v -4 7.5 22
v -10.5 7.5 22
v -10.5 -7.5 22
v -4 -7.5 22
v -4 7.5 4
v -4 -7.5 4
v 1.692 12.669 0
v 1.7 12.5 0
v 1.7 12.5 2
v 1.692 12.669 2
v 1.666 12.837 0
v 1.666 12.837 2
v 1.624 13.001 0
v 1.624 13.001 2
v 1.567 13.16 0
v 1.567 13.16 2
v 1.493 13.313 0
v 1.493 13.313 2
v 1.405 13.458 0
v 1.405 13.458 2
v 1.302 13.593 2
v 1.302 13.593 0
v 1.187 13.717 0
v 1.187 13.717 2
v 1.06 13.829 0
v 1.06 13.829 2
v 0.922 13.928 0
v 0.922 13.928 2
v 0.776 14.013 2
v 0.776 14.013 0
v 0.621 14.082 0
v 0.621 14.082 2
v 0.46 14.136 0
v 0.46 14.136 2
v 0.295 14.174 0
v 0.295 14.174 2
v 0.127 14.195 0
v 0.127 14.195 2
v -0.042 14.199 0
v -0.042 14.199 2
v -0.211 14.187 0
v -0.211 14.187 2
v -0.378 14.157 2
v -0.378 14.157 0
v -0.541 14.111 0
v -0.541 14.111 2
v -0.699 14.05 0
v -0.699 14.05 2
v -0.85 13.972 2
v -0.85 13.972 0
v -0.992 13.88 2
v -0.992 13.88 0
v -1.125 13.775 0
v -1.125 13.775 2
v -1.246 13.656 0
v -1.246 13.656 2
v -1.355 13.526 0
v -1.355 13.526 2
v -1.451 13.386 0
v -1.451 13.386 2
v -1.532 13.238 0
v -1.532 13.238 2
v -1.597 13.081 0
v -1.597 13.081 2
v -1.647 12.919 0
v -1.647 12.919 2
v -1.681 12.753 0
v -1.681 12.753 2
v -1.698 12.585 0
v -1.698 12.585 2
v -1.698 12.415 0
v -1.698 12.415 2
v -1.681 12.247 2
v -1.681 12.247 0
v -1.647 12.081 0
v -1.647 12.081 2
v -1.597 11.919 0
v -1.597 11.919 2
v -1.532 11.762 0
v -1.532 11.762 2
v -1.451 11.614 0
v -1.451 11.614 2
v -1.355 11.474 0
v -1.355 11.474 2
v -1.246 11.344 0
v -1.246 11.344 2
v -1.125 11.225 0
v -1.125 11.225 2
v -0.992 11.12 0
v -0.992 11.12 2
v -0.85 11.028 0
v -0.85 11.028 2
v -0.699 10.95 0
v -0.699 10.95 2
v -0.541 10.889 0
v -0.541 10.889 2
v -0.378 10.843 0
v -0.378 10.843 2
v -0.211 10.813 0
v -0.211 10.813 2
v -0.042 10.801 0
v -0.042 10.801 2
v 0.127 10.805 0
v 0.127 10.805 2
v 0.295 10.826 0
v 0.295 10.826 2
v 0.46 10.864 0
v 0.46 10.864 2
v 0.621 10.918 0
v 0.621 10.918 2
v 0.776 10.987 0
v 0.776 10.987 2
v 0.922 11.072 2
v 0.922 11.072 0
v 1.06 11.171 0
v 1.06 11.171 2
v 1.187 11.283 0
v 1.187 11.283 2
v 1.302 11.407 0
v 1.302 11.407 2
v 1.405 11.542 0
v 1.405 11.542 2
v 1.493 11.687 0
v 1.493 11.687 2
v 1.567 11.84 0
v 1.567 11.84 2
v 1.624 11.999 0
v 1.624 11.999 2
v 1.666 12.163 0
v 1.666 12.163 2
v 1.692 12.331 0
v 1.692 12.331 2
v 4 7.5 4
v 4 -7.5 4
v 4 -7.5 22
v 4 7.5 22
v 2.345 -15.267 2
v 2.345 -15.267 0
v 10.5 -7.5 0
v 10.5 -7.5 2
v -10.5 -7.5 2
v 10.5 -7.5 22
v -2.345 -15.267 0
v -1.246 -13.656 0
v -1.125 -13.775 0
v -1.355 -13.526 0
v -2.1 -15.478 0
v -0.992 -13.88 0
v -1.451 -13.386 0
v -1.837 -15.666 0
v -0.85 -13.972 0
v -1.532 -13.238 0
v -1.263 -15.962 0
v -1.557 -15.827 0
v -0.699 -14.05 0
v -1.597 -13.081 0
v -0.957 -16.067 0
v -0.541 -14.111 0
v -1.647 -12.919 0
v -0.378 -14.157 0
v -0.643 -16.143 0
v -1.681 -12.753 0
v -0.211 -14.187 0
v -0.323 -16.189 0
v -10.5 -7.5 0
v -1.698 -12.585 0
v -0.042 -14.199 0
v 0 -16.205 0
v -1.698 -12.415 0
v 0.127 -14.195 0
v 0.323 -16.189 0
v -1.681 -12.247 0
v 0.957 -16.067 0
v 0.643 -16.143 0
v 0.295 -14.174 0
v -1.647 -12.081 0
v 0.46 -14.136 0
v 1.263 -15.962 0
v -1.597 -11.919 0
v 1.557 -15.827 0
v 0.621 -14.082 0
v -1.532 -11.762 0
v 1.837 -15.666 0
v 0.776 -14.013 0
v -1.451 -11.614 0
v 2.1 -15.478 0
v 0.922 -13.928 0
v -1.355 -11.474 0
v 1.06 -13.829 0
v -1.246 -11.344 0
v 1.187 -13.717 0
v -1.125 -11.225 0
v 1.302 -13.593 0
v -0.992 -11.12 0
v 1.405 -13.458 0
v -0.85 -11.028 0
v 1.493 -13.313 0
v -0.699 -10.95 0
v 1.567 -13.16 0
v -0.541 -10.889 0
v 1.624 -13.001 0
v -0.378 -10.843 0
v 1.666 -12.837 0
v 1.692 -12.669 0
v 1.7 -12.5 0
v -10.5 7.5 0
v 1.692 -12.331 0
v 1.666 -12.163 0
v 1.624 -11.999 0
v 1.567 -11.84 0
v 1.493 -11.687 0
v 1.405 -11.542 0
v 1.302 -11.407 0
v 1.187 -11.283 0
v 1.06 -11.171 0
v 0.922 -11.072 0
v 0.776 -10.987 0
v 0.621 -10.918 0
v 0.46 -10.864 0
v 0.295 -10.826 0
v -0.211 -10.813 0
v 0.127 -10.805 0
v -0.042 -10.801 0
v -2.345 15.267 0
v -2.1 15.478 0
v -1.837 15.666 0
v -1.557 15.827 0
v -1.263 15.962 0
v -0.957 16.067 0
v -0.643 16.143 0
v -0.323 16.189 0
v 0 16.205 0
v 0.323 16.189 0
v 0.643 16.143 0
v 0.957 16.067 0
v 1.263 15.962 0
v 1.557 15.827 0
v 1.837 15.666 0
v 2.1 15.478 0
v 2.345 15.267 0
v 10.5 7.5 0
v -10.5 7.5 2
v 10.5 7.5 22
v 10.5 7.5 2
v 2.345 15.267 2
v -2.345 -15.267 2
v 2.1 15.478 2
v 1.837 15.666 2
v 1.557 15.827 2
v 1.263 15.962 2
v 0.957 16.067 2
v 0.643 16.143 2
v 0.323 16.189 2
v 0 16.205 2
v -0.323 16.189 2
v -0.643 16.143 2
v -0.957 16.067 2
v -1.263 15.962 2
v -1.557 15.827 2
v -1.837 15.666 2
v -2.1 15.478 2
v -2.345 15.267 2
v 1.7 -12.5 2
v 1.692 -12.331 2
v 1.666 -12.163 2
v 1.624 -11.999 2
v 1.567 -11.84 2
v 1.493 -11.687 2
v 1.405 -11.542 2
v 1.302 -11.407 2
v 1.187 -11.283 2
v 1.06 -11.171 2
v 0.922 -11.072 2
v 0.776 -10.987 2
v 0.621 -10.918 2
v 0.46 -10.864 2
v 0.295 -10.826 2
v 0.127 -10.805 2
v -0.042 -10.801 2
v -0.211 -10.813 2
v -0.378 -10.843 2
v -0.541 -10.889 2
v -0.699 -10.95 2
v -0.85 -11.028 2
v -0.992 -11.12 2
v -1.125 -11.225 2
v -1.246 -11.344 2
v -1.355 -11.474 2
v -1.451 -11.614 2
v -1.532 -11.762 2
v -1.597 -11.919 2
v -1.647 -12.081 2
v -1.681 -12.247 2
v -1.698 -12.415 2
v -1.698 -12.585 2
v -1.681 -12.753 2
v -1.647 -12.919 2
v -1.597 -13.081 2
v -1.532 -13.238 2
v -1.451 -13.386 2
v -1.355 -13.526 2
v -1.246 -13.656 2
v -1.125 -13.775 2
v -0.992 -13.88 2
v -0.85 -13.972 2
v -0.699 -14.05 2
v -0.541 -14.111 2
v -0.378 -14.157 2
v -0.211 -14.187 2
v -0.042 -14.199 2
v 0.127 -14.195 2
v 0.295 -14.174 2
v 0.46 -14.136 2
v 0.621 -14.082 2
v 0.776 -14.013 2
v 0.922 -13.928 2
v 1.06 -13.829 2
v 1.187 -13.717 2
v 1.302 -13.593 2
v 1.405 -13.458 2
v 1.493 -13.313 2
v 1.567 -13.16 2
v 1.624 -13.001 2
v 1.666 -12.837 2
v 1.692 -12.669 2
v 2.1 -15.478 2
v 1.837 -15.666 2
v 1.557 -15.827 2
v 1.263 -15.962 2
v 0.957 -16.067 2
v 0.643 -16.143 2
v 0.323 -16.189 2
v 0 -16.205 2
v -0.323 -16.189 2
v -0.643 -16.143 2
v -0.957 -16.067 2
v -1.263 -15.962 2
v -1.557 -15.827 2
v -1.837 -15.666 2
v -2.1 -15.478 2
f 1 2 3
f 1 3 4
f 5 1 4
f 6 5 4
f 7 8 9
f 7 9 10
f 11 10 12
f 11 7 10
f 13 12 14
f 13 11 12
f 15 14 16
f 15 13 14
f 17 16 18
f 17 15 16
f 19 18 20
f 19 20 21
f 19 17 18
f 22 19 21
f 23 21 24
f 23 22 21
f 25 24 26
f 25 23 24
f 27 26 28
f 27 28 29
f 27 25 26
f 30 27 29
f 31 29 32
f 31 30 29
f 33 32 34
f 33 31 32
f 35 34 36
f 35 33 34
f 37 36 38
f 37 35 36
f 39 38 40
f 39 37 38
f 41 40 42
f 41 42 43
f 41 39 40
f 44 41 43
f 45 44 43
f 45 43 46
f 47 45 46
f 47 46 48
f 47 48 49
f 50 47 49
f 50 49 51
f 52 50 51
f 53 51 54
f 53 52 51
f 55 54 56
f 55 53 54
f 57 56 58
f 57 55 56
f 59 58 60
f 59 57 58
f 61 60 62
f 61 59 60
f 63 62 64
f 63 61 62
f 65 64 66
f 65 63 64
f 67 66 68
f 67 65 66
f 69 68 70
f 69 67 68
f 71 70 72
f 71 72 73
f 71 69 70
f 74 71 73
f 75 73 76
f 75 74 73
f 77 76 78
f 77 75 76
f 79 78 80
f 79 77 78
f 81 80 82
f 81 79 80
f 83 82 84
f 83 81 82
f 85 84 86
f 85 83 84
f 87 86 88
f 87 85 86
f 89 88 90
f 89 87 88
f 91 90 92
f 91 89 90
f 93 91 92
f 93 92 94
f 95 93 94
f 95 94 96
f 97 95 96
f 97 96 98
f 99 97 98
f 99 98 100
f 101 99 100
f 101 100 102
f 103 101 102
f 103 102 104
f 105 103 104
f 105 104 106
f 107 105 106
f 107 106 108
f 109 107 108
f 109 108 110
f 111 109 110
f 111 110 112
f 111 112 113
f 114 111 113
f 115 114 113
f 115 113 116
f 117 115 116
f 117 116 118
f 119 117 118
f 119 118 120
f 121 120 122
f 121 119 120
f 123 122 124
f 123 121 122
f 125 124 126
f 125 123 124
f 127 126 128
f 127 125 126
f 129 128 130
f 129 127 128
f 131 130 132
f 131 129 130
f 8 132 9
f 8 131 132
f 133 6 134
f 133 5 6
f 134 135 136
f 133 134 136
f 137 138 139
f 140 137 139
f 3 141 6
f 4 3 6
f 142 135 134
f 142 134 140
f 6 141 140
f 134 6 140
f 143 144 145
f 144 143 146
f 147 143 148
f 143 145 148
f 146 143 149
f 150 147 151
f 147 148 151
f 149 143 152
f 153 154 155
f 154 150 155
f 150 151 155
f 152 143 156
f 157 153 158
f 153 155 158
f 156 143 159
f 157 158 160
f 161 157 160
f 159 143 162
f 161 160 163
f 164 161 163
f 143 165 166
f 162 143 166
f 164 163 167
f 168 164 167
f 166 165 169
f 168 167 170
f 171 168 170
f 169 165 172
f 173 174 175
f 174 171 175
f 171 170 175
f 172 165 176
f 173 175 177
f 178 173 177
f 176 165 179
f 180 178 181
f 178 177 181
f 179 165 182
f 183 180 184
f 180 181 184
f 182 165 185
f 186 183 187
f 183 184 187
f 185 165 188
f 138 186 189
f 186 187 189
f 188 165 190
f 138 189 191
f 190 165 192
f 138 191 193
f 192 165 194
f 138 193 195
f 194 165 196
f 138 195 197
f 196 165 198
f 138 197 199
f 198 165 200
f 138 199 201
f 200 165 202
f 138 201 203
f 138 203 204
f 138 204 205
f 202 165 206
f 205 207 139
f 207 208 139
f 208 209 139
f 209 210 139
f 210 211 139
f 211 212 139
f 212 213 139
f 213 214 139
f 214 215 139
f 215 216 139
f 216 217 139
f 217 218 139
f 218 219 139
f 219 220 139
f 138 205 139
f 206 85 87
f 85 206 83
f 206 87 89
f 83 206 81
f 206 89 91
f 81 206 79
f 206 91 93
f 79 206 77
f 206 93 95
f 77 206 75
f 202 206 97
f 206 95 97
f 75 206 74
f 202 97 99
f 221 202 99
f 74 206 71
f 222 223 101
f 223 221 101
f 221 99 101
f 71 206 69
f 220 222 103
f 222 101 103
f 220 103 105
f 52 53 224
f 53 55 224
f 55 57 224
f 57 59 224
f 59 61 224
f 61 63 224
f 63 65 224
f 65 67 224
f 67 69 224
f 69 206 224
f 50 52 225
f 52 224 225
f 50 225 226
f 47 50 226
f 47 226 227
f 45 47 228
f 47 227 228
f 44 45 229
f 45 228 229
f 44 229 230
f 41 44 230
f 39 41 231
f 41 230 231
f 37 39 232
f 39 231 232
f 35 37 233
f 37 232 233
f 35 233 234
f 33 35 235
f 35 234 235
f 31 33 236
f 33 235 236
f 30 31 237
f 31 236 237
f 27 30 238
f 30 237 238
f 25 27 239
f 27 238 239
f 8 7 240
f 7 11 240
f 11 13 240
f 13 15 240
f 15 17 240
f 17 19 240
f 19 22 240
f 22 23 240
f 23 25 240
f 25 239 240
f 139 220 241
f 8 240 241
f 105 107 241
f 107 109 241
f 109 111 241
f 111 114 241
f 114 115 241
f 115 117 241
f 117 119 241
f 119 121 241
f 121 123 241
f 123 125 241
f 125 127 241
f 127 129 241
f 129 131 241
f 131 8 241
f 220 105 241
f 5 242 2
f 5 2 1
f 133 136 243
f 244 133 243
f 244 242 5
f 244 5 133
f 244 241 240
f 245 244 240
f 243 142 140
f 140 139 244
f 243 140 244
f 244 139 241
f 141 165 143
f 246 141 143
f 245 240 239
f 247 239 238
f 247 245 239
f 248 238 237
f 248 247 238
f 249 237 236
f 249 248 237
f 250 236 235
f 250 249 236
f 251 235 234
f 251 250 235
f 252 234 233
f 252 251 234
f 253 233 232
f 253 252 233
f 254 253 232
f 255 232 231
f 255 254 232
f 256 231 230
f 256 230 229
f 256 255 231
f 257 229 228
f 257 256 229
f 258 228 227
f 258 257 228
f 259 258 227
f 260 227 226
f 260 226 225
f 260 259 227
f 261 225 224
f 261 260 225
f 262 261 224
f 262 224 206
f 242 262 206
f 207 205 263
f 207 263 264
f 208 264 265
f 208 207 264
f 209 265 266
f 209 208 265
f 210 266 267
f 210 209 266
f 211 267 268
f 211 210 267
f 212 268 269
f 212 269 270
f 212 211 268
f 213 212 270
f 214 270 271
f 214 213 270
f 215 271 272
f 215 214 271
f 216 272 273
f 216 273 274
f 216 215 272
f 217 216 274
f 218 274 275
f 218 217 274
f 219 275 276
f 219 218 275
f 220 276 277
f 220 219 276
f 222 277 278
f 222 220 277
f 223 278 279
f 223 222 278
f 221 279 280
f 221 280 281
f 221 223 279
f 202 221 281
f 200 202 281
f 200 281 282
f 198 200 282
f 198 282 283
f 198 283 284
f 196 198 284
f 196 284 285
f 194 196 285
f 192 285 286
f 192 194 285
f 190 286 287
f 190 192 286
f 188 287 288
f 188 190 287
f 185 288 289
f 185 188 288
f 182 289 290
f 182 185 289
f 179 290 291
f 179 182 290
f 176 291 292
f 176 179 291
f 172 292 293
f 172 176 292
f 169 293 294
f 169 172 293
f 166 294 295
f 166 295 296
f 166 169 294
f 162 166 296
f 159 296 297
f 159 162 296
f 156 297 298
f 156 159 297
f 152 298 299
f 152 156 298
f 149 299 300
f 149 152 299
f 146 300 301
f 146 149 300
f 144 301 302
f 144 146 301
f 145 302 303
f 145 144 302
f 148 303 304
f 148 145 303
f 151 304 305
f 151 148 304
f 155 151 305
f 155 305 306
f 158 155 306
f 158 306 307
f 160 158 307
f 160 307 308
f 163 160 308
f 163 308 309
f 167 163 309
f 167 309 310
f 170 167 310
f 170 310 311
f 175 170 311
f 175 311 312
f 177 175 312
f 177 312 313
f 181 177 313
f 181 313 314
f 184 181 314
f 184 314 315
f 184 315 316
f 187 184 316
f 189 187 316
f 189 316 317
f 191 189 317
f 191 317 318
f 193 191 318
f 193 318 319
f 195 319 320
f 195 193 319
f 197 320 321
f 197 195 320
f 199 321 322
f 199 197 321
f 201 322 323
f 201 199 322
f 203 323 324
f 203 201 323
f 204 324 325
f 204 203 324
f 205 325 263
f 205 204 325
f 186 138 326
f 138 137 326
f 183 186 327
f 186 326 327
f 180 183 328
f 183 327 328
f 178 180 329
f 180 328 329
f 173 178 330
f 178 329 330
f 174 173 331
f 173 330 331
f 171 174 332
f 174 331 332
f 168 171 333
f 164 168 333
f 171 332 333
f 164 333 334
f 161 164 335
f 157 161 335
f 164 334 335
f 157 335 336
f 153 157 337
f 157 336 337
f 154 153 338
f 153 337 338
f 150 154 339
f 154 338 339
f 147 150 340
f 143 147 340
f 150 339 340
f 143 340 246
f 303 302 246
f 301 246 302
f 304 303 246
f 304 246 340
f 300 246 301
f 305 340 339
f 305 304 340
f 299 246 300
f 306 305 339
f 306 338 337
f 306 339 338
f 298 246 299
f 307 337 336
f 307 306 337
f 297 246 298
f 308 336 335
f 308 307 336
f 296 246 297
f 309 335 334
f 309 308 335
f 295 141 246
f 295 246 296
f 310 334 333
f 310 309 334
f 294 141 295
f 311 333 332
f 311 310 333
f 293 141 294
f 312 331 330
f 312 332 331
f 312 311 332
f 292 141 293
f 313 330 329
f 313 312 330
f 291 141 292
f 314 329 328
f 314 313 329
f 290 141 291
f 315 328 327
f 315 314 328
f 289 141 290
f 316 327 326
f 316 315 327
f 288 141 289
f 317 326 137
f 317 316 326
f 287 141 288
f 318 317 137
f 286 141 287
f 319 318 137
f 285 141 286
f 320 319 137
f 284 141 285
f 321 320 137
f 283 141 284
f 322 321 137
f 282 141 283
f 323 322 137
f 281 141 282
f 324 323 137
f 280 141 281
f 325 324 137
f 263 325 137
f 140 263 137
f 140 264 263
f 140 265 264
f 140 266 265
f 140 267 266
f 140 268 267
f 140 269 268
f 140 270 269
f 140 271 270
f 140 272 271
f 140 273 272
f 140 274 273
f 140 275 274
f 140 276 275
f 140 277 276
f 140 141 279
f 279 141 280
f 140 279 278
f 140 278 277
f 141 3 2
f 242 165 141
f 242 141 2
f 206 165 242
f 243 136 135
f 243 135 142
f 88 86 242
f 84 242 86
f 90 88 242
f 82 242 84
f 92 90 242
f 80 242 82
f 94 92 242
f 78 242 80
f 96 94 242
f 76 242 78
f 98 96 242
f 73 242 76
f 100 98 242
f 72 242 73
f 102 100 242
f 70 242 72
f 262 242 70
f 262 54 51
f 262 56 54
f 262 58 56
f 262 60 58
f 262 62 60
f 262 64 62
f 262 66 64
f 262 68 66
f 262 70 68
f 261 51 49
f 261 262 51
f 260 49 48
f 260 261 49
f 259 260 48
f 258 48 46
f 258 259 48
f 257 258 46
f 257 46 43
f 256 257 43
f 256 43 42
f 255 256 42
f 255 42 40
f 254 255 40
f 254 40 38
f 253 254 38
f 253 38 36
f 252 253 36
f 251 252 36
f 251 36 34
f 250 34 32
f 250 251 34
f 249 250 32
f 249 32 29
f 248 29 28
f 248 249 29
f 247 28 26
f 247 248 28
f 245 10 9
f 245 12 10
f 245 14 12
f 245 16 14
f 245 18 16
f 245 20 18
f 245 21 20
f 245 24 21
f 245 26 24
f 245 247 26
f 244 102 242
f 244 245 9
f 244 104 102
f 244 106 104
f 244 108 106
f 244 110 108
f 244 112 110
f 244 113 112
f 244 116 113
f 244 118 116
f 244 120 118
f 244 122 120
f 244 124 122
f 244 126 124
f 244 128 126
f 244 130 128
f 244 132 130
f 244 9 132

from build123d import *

# Parameters (mm, degrees)
F0_W     = 21
F0_H     = 15
F0_W_2   = 19.5
F0_H_2   = 12.75
F1_DEPTH = 22
F0_R     = 1.7
F2_DEPTH = 2
F3_R     = 3.4
F5_DEPTH = 18


with BuildPart() as f1:
    # F0 (on Top) → F1 (new body)
    with BuildSketch(Plane.XY):
        Rectangle(F0_W, F0_H)
        Rectangle(F0_W_2, F0_H_2, mode=Mode.SUBTRACT)
        Rectangle(F0_W_2, F0_H_2)
    extrude(amount=F1_DEPTH)

    # F0 (on Top) → F2 (join)
    with BuildSketch(Plane.XY):
        Polygon((10.5, -7.5), (-10.5, -7.5), (0, -17.5), align=None)
        with Locations((0, -12.5)):
            Circle(F0_R, mode=Mode.SUBTRACT)
        Polygon((0, 17.5), (-10.5, 7.5), (10.5, 7.5), align=None)
        with Locations((0, 12.5)):
            Circle(F0_R, mode=Mode.SUBTRACT)
    extrude(amount=F2_DEPTH)

    # F3
    f3_edges = [f1.edges().sort_by_distance(p)[0] for p in [
        (0, -17.5, 1),
        (0, 17.5, 1),
    ]]
    fillet(f3_edges, radius=F3_R)

    # F4 (on face) → F5 (cut)
    with BuildSketch(Plane.XY.offset(22)):
        Polygon((-4, -7.5), (0, -7.5), (4, -7.5), (4, 7.5), (-4, 7.5), align=None)
    extrude(amount=-F5_DEPTH, mode=Mode.SUBTRACT)


solid = f1.part
